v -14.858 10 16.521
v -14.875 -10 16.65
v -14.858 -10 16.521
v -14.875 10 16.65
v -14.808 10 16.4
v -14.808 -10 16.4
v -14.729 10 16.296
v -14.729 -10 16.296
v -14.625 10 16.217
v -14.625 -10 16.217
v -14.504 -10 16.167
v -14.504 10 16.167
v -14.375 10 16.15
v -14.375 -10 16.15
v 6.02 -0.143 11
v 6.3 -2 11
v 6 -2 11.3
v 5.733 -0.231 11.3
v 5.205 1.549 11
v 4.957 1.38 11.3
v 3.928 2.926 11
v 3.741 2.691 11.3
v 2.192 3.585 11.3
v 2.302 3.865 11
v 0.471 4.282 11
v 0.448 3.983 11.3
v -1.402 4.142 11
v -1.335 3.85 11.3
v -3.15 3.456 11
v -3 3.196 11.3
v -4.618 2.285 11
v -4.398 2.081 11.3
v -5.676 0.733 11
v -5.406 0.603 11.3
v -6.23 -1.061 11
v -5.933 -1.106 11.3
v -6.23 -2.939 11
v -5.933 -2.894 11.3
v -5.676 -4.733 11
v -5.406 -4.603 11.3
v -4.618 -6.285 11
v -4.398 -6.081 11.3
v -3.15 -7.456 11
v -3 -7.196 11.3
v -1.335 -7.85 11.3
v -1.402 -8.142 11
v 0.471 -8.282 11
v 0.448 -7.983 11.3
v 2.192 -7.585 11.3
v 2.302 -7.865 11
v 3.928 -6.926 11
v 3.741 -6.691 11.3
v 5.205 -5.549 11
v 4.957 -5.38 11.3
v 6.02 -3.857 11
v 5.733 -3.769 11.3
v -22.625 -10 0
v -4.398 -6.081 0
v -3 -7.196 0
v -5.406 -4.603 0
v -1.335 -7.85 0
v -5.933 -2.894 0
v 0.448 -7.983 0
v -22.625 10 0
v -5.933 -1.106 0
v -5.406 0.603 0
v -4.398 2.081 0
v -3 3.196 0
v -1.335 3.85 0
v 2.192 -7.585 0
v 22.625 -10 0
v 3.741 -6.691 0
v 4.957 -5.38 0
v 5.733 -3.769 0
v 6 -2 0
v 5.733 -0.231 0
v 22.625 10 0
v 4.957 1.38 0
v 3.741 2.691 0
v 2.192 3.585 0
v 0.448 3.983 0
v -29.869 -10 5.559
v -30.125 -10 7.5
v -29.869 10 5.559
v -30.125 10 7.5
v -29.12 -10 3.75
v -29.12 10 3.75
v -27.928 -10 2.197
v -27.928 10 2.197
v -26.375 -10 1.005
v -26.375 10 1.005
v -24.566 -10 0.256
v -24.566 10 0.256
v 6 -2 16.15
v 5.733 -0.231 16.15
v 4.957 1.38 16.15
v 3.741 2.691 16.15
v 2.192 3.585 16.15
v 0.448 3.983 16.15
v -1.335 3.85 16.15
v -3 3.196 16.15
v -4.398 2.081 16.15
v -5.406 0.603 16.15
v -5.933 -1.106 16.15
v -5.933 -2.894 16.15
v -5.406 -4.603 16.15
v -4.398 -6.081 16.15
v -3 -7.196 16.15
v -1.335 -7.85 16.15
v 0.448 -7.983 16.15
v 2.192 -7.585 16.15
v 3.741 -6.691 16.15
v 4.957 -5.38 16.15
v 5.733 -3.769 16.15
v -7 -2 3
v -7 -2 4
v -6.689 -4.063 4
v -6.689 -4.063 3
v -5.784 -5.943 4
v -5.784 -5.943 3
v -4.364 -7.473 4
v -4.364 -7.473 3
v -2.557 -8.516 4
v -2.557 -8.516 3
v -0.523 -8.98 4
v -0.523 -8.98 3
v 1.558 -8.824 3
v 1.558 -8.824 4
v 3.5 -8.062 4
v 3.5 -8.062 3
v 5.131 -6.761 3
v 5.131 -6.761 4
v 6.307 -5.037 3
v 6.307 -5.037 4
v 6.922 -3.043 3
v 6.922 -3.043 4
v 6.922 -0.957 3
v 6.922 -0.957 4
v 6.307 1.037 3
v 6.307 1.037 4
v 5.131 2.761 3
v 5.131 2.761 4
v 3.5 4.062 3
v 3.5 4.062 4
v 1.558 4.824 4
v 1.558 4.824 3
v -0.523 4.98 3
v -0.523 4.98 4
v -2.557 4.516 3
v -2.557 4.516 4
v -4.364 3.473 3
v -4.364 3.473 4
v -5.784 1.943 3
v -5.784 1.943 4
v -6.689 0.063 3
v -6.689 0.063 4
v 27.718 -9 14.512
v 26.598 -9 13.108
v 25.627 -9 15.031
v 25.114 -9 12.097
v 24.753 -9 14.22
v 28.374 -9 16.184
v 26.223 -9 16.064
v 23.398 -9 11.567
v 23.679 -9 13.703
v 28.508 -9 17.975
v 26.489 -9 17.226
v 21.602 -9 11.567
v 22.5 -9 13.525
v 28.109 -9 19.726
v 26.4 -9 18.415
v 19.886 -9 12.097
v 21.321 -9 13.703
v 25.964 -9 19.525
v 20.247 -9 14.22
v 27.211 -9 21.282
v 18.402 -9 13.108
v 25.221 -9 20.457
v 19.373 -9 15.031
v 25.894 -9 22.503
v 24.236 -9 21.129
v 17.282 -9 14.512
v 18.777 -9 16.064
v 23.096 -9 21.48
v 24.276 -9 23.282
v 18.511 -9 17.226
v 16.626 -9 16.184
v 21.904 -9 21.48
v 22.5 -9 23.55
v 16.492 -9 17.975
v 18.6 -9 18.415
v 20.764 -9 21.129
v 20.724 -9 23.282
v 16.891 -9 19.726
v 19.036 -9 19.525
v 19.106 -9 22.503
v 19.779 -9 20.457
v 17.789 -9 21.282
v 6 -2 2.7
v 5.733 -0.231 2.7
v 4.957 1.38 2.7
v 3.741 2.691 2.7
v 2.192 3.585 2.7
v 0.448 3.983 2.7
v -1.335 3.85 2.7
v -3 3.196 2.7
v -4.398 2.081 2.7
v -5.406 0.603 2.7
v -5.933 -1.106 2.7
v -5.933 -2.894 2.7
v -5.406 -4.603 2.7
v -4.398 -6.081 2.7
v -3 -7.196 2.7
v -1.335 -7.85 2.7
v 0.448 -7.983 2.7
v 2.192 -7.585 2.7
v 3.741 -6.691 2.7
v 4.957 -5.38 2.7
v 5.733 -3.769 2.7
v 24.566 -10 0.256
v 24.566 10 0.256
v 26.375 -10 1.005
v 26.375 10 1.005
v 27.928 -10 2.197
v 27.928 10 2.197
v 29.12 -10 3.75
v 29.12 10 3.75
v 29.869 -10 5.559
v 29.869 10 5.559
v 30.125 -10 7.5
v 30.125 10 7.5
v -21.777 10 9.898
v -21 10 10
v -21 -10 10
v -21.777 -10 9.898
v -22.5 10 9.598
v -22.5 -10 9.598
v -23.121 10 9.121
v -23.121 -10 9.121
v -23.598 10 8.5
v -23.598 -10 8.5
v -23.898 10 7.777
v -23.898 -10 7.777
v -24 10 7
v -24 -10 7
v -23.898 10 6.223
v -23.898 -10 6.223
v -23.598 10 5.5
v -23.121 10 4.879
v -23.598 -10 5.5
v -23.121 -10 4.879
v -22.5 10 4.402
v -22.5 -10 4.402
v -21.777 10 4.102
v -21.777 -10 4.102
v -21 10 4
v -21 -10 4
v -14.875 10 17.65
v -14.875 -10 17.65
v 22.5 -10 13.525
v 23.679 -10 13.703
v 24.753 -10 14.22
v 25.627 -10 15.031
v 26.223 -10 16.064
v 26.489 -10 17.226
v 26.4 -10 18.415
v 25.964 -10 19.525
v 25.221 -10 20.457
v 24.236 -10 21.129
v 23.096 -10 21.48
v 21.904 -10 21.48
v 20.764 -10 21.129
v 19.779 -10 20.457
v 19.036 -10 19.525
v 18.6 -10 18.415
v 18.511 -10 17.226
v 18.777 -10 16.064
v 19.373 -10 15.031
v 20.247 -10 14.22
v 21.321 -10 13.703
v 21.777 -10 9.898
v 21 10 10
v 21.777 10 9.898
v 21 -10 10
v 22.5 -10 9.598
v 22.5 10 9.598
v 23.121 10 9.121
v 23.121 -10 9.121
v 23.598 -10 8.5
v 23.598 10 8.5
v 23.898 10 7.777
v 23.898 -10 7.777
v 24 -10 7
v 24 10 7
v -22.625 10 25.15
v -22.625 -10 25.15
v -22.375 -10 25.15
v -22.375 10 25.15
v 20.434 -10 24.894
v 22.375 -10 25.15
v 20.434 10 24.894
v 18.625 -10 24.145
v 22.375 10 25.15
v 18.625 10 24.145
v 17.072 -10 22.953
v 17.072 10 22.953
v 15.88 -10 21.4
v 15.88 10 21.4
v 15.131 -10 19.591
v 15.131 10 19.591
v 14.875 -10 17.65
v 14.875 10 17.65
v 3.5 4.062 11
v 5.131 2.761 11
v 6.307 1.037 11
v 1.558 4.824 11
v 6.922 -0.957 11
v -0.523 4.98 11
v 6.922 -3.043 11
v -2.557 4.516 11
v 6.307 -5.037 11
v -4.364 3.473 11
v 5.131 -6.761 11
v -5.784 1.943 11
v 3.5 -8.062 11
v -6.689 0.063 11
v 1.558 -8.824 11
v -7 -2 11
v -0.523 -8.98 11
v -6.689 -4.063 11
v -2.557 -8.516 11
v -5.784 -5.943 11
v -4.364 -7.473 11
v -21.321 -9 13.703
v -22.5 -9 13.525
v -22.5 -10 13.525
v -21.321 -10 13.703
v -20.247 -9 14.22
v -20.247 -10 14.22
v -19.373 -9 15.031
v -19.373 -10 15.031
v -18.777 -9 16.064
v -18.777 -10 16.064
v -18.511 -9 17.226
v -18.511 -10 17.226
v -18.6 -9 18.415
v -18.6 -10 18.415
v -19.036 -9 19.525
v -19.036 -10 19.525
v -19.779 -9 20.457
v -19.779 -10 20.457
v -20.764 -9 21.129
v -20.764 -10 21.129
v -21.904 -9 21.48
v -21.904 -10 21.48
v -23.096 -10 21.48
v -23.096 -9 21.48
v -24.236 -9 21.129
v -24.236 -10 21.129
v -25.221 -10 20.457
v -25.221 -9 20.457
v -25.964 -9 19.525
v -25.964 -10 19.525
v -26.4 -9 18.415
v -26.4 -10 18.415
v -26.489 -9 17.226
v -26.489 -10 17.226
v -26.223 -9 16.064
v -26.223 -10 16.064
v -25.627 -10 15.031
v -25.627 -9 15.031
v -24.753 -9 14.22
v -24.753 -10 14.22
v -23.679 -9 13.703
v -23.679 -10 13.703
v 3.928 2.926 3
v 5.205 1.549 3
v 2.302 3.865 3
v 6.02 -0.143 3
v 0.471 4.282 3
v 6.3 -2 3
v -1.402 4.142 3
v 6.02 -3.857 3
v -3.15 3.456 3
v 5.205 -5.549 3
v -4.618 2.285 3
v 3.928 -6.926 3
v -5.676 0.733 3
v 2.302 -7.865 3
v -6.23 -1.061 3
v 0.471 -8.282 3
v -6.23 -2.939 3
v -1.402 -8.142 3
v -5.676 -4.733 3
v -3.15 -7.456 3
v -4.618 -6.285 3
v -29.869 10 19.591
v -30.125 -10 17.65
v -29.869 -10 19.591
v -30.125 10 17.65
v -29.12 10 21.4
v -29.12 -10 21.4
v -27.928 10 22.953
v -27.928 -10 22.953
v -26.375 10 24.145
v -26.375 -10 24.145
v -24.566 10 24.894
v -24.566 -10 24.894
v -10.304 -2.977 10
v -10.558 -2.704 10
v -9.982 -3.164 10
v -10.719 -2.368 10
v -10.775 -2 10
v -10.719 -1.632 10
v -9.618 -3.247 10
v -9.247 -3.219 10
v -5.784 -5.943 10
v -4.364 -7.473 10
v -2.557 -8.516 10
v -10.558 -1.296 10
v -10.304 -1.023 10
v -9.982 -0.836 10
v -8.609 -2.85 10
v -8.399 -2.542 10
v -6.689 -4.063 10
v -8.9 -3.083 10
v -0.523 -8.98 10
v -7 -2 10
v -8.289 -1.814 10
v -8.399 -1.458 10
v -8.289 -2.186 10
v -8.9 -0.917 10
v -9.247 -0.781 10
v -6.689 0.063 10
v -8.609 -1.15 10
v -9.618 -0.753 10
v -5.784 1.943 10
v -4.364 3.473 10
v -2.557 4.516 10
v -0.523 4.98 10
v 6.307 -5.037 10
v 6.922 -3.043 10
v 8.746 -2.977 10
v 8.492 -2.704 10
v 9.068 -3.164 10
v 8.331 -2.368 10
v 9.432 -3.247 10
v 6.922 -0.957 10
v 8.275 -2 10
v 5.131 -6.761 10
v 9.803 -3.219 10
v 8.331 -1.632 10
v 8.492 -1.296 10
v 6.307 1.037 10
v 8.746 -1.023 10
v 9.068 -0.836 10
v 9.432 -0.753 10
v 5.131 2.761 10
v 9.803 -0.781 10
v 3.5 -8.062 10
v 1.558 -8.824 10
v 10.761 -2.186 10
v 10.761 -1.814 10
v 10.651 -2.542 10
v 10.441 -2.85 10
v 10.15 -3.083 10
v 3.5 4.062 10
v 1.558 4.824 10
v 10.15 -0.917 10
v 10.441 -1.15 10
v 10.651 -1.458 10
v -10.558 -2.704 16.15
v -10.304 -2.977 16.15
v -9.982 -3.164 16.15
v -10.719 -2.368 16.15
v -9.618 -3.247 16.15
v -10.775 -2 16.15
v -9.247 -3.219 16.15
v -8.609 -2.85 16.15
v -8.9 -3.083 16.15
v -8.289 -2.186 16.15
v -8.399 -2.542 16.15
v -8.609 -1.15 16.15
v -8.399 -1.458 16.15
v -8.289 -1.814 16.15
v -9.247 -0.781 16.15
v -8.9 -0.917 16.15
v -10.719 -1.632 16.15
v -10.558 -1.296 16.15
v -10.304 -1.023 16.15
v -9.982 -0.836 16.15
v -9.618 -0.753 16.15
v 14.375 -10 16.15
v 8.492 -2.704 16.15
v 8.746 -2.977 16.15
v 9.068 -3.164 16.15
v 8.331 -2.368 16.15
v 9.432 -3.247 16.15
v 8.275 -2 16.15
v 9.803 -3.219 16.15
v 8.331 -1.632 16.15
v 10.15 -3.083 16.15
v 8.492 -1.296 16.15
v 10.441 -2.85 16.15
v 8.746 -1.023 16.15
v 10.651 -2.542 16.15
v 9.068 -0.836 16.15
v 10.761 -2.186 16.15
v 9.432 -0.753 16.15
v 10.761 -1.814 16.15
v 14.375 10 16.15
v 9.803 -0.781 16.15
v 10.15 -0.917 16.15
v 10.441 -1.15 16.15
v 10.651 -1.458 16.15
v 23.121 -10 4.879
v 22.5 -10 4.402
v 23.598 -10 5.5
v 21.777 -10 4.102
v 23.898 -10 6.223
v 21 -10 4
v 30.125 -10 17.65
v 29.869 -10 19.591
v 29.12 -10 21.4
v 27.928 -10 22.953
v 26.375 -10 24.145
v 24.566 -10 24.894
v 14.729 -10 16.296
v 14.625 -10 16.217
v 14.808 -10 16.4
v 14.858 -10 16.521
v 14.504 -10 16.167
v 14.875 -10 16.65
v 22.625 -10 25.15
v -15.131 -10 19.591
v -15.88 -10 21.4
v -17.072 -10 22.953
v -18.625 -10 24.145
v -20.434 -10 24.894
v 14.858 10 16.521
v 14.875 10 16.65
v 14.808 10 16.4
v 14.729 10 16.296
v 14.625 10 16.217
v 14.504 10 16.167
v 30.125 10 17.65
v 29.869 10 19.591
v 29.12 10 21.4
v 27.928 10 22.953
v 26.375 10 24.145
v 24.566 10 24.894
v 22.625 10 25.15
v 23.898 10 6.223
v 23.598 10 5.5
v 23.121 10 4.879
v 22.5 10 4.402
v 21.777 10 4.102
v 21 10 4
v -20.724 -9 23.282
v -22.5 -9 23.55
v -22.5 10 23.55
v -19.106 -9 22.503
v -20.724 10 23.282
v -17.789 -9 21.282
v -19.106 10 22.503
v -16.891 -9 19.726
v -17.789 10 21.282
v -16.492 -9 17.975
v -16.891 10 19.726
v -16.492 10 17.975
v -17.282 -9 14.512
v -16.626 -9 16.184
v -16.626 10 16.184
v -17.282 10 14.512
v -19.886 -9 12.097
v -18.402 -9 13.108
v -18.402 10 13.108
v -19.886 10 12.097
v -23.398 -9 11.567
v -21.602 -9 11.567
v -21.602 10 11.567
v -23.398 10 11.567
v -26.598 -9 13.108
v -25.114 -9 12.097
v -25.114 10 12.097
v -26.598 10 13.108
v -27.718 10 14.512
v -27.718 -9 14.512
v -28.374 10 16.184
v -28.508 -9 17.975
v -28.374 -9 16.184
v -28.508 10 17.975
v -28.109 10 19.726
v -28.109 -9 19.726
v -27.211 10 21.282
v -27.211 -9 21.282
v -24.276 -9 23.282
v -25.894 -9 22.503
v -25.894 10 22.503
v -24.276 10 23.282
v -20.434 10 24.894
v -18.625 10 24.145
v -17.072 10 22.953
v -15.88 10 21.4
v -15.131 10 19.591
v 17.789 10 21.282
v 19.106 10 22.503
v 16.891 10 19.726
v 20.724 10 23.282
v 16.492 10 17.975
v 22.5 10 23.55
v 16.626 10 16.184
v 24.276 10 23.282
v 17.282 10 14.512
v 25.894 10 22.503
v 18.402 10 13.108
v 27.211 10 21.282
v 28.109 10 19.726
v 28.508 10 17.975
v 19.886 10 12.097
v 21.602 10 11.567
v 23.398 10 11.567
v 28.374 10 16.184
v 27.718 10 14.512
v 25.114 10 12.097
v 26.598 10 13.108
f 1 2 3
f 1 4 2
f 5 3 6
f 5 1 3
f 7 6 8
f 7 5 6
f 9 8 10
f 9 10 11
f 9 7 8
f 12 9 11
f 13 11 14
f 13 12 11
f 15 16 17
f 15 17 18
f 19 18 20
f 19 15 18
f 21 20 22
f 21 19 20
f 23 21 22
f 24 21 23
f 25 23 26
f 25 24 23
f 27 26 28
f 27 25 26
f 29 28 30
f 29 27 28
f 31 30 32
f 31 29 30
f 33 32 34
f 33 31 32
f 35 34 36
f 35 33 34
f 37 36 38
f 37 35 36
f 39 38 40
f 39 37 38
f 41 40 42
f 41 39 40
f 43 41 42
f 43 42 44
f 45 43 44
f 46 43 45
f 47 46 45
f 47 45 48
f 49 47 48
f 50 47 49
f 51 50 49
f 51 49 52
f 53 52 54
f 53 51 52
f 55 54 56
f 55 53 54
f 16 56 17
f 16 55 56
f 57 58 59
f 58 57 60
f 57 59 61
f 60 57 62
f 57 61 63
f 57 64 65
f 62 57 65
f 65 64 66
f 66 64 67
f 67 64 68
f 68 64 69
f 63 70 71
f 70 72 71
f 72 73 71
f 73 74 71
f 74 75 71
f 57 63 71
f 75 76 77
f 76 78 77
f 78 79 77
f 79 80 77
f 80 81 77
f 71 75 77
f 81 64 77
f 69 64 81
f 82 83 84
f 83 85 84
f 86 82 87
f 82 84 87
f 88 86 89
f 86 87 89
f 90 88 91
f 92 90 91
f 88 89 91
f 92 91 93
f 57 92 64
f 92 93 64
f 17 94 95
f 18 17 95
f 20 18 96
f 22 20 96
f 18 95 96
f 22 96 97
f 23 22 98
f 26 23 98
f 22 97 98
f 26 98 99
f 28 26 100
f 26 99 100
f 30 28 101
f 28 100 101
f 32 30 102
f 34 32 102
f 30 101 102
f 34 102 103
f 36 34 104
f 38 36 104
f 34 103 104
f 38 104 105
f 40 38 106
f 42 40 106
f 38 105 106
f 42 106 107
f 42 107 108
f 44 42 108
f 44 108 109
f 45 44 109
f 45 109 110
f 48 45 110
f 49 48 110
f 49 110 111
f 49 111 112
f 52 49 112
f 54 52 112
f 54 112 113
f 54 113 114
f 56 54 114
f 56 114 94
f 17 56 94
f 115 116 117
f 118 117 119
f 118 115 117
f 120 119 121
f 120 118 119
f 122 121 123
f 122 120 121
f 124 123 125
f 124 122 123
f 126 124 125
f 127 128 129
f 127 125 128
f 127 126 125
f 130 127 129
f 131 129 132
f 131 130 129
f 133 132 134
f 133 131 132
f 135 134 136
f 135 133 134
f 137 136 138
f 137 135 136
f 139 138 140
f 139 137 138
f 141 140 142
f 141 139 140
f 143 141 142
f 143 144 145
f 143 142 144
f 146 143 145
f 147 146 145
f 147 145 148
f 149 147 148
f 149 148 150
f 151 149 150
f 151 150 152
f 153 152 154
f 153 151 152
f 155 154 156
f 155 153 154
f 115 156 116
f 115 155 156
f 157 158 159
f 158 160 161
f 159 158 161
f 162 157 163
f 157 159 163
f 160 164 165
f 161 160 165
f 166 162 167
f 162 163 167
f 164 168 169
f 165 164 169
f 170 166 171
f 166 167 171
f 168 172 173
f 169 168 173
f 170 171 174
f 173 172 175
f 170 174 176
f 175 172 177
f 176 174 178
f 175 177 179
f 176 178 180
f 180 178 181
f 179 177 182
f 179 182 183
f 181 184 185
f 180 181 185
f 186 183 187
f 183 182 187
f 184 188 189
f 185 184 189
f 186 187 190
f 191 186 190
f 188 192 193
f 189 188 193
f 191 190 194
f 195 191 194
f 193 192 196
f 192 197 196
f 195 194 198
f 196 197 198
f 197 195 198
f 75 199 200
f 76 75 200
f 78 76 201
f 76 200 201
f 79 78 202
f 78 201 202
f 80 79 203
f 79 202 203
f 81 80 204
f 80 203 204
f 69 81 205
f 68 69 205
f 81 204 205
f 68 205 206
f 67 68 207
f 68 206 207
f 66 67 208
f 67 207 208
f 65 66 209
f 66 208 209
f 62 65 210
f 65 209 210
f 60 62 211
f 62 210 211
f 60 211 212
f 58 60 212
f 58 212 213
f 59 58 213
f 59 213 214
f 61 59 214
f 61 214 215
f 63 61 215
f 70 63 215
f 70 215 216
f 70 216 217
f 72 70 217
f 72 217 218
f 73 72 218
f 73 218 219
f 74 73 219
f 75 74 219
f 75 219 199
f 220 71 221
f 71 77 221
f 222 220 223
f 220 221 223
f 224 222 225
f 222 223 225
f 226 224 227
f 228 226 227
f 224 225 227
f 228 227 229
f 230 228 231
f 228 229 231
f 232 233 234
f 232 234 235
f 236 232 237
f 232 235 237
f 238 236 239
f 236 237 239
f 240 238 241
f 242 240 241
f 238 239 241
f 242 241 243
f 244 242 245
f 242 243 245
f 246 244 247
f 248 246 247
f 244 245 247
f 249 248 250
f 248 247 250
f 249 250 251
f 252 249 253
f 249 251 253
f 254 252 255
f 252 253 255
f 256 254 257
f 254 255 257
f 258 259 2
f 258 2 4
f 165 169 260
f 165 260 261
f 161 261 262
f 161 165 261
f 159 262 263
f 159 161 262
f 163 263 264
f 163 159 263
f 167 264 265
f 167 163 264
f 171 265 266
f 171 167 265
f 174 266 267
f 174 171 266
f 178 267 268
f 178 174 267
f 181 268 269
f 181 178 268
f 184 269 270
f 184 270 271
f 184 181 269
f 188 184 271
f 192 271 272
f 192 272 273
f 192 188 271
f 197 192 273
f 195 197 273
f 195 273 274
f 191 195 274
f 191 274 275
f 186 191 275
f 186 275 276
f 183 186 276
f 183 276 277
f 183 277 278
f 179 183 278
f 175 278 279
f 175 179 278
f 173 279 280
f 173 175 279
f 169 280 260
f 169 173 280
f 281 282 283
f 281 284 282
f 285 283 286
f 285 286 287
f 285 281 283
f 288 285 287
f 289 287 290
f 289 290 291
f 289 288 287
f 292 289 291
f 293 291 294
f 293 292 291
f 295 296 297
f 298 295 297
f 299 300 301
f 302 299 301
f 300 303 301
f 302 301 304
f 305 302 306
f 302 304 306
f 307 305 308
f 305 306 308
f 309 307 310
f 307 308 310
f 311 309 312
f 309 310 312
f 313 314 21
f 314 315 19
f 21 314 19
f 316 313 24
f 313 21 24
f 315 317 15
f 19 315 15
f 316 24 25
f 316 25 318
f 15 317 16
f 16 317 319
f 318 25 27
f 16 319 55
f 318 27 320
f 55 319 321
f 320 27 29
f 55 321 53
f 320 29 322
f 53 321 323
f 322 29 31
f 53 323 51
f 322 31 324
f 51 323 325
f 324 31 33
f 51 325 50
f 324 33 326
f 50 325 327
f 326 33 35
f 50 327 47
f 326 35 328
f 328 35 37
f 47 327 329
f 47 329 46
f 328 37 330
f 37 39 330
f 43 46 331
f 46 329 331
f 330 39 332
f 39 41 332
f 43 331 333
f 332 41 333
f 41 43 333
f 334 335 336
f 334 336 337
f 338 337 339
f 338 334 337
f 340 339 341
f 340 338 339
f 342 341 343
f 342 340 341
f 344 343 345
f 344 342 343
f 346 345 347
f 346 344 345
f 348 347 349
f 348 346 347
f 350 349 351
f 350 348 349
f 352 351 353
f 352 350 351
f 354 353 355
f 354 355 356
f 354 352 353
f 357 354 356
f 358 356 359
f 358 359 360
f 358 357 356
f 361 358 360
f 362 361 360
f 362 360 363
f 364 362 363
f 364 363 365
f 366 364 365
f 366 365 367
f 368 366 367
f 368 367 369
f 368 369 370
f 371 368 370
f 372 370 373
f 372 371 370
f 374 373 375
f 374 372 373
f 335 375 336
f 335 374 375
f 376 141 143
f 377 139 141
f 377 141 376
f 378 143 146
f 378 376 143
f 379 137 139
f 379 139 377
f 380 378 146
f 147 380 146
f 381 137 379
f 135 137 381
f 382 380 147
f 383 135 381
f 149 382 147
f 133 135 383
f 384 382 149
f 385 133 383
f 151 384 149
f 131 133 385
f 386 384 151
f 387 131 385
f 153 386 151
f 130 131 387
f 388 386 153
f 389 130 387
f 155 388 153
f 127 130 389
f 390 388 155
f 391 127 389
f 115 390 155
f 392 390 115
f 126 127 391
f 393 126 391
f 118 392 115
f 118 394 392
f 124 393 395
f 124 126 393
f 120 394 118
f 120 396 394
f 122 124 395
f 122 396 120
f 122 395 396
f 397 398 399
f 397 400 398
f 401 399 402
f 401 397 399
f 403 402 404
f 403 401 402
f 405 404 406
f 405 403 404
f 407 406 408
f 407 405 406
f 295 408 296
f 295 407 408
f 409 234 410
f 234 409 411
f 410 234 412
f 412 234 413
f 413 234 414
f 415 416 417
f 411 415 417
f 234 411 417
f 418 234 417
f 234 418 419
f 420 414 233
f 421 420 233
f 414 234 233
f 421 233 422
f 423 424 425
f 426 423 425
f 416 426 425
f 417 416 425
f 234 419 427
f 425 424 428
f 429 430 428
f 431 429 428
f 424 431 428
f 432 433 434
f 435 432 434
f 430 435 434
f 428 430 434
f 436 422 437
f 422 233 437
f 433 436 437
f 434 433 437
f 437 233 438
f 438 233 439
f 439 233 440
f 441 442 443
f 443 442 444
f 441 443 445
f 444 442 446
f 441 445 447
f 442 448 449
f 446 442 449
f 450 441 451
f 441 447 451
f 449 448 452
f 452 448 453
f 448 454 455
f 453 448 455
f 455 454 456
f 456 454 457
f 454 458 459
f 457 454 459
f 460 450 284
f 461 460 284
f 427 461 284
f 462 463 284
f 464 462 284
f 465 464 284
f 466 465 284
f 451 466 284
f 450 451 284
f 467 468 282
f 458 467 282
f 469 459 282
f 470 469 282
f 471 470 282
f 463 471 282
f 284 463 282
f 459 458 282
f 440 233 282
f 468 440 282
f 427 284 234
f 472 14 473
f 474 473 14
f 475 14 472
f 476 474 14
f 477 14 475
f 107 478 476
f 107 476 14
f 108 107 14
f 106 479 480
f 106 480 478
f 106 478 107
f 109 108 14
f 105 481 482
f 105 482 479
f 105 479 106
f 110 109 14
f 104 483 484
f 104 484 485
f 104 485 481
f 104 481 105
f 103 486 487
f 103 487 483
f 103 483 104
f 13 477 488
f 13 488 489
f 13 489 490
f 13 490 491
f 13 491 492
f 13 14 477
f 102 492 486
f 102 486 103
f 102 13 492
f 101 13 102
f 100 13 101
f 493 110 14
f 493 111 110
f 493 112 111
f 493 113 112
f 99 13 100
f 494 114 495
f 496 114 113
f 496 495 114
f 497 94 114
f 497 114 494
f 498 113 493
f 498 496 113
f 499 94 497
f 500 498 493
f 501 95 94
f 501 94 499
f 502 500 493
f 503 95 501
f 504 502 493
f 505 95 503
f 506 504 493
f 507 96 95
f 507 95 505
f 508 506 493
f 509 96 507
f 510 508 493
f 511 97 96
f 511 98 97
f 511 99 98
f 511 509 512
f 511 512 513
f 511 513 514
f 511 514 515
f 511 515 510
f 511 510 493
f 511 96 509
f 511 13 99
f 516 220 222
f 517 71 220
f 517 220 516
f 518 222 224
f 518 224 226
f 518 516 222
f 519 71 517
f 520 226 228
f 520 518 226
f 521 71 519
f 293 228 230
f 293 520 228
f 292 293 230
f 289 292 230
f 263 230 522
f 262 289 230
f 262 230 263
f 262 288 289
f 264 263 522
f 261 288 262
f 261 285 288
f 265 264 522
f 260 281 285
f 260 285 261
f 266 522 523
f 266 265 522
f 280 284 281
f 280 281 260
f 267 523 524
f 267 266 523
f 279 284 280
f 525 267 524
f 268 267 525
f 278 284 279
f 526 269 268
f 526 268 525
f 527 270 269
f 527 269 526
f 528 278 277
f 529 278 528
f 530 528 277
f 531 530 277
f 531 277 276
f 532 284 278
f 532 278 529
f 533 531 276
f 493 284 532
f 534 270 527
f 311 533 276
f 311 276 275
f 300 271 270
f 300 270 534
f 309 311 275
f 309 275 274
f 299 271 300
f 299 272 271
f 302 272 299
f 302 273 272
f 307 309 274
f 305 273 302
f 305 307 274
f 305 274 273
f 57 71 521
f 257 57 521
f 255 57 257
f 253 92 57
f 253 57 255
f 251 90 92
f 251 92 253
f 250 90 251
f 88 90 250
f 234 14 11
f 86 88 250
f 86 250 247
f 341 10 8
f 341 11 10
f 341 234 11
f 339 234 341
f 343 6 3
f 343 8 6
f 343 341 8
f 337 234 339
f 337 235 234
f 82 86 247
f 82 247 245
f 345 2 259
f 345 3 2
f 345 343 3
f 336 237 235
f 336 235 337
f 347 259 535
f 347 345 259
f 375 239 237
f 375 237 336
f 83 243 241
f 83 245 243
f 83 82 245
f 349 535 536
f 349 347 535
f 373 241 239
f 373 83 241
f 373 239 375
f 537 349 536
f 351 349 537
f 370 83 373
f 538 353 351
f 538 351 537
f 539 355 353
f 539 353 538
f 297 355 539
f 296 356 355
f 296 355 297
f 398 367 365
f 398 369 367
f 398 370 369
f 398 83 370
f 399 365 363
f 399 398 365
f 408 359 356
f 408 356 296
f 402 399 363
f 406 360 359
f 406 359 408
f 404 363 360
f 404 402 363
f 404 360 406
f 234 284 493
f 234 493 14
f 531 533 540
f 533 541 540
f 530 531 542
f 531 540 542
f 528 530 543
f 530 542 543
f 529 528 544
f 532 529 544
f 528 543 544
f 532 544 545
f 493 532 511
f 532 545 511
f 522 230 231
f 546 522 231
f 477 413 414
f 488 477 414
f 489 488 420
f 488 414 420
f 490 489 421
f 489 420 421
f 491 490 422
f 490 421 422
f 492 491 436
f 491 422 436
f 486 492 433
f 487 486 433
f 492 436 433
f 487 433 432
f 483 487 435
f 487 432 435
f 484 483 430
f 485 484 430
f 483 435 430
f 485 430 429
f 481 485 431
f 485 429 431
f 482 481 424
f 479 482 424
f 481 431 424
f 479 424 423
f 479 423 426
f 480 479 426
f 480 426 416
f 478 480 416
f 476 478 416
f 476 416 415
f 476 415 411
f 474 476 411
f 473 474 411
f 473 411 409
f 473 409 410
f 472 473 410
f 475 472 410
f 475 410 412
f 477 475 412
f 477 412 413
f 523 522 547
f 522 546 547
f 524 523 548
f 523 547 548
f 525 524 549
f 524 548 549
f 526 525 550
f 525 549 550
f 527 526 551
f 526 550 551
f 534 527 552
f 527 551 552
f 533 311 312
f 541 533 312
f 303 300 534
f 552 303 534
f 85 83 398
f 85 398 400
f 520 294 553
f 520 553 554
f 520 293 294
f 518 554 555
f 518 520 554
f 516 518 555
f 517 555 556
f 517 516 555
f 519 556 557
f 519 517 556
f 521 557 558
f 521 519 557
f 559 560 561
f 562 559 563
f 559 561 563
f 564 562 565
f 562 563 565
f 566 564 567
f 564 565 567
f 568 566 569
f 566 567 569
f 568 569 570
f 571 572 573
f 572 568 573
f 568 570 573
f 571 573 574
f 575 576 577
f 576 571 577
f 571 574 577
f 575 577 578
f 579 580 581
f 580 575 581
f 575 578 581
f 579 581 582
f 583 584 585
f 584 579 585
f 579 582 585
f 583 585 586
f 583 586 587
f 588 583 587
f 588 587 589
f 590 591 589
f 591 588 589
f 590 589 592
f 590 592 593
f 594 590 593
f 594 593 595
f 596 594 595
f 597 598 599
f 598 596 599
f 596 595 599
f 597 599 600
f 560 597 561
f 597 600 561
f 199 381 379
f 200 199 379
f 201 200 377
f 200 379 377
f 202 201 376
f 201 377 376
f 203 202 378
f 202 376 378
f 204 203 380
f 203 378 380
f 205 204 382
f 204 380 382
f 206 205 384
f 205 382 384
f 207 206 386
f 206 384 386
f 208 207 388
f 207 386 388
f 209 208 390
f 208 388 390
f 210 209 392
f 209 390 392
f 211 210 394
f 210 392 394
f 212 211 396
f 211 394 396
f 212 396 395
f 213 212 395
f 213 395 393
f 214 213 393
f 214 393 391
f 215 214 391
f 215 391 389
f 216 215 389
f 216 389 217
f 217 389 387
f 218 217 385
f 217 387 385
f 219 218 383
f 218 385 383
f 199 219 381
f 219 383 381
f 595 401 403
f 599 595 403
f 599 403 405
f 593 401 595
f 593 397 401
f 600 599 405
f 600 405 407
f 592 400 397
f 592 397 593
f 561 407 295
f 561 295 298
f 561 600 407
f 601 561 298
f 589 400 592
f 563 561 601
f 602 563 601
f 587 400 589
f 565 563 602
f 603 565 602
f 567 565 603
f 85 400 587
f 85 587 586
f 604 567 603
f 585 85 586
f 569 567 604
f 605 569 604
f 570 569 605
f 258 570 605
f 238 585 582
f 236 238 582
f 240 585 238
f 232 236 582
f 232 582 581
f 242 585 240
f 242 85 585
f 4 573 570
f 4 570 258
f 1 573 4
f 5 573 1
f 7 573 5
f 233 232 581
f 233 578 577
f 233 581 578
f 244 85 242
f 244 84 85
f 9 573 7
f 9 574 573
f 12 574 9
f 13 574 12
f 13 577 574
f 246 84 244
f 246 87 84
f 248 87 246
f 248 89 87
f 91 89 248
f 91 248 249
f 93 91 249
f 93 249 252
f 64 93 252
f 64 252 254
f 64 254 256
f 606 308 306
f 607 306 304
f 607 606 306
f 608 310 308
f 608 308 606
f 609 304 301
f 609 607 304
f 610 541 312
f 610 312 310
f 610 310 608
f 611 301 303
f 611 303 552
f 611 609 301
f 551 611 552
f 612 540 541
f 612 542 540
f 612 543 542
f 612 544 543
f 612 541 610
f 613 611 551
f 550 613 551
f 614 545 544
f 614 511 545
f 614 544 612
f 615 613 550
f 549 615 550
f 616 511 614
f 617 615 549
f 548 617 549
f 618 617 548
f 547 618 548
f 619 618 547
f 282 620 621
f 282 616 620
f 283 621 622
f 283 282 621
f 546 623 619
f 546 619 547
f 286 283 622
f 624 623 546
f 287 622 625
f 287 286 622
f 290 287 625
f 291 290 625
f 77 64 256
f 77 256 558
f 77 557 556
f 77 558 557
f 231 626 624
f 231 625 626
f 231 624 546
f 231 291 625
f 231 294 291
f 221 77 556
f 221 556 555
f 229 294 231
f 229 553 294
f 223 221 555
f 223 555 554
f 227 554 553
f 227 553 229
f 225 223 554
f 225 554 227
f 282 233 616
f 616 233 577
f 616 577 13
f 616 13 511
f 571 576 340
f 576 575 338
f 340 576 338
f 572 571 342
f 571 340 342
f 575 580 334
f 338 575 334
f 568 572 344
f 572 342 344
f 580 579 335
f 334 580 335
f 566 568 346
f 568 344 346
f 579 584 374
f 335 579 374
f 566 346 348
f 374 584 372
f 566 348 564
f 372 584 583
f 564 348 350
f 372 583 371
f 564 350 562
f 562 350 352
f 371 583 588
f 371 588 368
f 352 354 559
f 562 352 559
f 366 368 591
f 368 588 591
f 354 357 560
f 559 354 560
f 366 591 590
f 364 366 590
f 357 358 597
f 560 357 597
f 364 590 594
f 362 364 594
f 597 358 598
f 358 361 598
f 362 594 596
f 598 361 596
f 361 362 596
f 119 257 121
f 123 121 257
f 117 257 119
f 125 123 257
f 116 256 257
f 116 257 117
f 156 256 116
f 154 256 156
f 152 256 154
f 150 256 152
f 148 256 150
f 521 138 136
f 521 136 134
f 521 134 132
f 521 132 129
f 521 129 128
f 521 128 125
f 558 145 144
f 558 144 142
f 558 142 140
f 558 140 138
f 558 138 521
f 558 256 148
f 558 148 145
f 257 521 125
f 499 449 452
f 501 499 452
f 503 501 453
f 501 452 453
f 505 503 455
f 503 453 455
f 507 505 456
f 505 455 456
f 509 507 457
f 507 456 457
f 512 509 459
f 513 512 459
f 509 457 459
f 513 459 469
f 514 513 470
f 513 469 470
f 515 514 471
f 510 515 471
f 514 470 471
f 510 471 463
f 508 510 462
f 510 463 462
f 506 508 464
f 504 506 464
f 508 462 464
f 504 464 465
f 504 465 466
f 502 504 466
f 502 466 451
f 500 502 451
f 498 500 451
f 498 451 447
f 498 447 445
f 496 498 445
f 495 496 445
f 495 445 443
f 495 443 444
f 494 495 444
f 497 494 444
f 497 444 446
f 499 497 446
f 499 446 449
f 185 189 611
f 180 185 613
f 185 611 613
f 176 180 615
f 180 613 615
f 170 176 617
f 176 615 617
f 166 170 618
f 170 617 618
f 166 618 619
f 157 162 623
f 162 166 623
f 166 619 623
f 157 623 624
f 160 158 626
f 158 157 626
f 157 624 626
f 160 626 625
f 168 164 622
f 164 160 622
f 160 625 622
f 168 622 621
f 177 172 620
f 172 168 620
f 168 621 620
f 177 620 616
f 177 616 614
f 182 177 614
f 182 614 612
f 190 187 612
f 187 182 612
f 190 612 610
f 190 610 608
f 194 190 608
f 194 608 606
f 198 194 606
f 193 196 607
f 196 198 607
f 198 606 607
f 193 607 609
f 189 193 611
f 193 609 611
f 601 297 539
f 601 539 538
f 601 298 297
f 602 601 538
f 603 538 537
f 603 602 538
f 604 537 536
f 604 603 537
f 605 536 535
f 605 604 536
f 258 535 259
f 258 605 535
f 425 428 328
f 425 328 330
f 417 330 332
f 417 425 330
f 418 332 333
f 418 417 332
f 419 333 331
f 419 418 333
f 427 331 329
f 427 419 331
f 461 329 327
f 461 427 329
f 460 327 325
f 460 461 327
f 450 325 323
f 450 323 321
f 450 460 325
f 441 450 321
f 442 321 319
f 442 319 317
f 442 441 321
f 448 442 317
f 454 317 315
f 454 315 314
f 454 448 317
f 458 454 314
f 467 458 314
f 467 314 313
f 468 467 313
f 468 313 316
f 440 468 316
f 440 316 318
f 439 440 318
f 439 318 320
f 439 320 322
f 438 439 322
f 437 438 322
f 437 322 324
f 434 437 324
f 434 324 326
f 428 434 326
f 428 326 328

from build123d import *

# Parameters (mm, degrees)
ESQUISSE2_W                         = 60.25
ESQUISSE2_H                         = 20
BOSS_EXTRU_2_DEPTH                  = 25.15
ESQUISSE3_W                         = 29.75
ESQUISSE3_H                         = 20
ENL_V_MAT_EXTRU_1_DEPTH             = 9
ESQUISSE4_W                         = 48
ESQUISSE4_H                         = 6
ENL_V_MAT_EXTRU_2_DEPTH             = 45.045863881
ESQUISSE5_R                         = 6
ENL_V_MAT_EXTRU_3_DEPTH             = 36.613735061
ENL_V_START                         = -1
ESQUISSE6_R                         = 7
ENL_V_MAT_EXTRU_4_DEPTH             = 8
ESQUISSE7_R                         = 6.025
ENL_V_MAT_EXTRU_5_DEPTH             = 45.045863881
CONG_1_R                            = 7.5
CONG_2_R                            = 0.5
DIAM_TRE_DU_PER_AGE_2_5_2_5_1_D     = 2.5
DIAM_TRE_DU_PER_AGE_2_5_2_5_1_DEPTH = 6.15
CONG_4_R                            = 3
BOSS_EXTRU_3_START                  = -1
ESQUISSE11_R                        = 6.025
ESQUISSE11_R_2                      = 4
BOSS_EXTRU_3_DEPTH                  = 1
CHANFREIN2_SIZE                     = 0.3


with BuildPart() as part:
    # Esquisse2 → Boss.-Extru.2 (new body)
    with BuildSketch(Plane.XY):
        Rectangle(ESQUISSE2_W, ESQUISSE2_H)
    extrude(amount=BOSS_EXTRU_2_DEPTH)

    # Esquisse3 → Enlèv. mat.-Extru.1 (cut)
    with BuildSketch(Plane.XY.offset(25.15)):
        Rectangle(ESQUISSE3_W, ESQUISSE3_H)
    extrude(amount=-ENL_V_MAT_EXTRU_1_DEPTH, mode=Mode.SUBTRACT)

    # Esquisse4 → Enlèv. mat.-Extru.2 (cut, through all)
    with BuildSketch(Plane(origin=(0, 10, 0), x_dir=(1, 0, 0), z_dir=(0, 1, 0))):
        with Locations((0, -7)):
            Rectangle(ESQUISSE4_W, ESQUISSE4_H)
    extrude(amount=-ENL_V_MAT_EXTRU_2_DEPTH, mode=Mode.SUBTRACT)

    # Esquisse5 → Enlèv. mat.-Extru.3 (cut, through all)
    with BuildSketch(Plane.XY.offset(16.15)):
        with Locations((0, -2)):
            Circle(ESQUISSE5_R)
    extrude(amount=-ENL_V_MAT_EXTRU_3_DEPTH, mode=Mode.SUBTRACT)

    # Esquisse6 → Enlèv. mat.-Extru.4 (cut)
    with BuildSketch(Plane.XY.offset(4).offset(ENL_V_START)):
        with Locations(Location((0, -2, 0), (0, 0, 180))):
            Circle(ESQUISSE6_R)
    extrude(amount=ENL_V_MAT_EXTRU_4_DEPTH, mode=Mode.SUBTRACT)

    # Esquisse7 → Enlèv. mat.-Extru.5 (cut, through all)
    with BuildSketch(Plane(origin=(0, 10, 0), x_dir=(1, 0, 0), z_dir=(0, 1, 0))):
        with Locations(Location((-22.5, -17.525, 0), (0, 0, 270))):
            Circle(ESQUISSE7_R)
        with Locations(Location((22.5, -17.525, 0), (0, 0, 270))):
            Circle(ESQUISSE7_R)
    extrude(amount=-ENL_V_MAT_EXTRU_5_DEPTH, mode=Mode.SUBTRACT)

    # Congé1
    cong_1_edges = [part.edges().sort_by_distance(p)[0] for p in [
        (-30.125, 0, 25.15),
        (14.875, 0, 25.15),
        (-14.875, 0, 25.15),
        (-30.125, 0, 0),
        (30.125, 0, 0),
        (30.125, 0, 25.15),
    ]]
    fillet(cong_1_edges, radius=CONG_1_R)

    # Congé2
    cong_2_edges = [part.edges().sort_by_distance(p)[0] for p in [
        (14.875, 0, 16.15),
        (-14.875, 0, 16.15),
    ]]
    fillet(cong_2_edges, radius=CONG_2_R)

    # Diamètre du perçage Ø2.5 (2.5)1
    with Locations(Plane.XY.offset(16.15)):
        with Locations((-9.525, -2), (9.525, -2)):
            Hole(DIAM_TRE_DU_PER_AGE_2_5_2_5_1_D / 2, depth=DIAM_TRE_DU_PER_AGE_2_5_2_5_1_DEPTH)

    # Congé4
    cong_4_edges = [part.edges().sort_by_distance(p)[0] for p in [
        (-24, 0, 10),
        (-24, 0, 4),
        (24, 0, 4),
        (24, 0, 10),
    ]]
    fillet(cong_4_edges, radius=CONG_4_R - 0.0001)  # a hair under: the kernel refuses the full size

    # Esquisse11 → Boss.-Extru.3 (add)
    # profile 1 of 2: a face of its own
    with BuildSketch(Plane.XZ.offset(10).offset(BOSS_EXTRU_3_START)):
        with Locations(Location((22.5, 17.525, 0), (0, 0, 90))):
            Circle(ESQUISSE11_R)
        with Locations(Location((22.5, 17.525, 0), (0, 0, 270))):
            Circle(ESQUISSE11_R_2, mode=Mode.SUBTRACT)
    # profile 2 of 2: a face of its own
    with BuildSketch(Plane.XZ.offset(10).offset(BOSS_EXTRU_3_START)):
        with Locations(Location((-22.5, 17.525, 0), (0, 0, 90))):
            Circle(ESQUISSE11_R)
        with Locations(Location((-22.5, 17.525, 0), (0, 0, 270))):
            Circle(ESQUISSE11_R_2, mode=Mode.SUBTRACT)
    extrude(amount=BOSS_EXTRU_3_DEPTH)

    # Chanfrein2
    chanfrein2_edges = [part.edges().sort_by_distance(p)[0] for p in [
        (-6, -2, 11),
        (-6, -2, 3),
    ]]
    chamfer(chanfrein2_edges, length=CHANFREIN2_SIZE)


solid = part.part
